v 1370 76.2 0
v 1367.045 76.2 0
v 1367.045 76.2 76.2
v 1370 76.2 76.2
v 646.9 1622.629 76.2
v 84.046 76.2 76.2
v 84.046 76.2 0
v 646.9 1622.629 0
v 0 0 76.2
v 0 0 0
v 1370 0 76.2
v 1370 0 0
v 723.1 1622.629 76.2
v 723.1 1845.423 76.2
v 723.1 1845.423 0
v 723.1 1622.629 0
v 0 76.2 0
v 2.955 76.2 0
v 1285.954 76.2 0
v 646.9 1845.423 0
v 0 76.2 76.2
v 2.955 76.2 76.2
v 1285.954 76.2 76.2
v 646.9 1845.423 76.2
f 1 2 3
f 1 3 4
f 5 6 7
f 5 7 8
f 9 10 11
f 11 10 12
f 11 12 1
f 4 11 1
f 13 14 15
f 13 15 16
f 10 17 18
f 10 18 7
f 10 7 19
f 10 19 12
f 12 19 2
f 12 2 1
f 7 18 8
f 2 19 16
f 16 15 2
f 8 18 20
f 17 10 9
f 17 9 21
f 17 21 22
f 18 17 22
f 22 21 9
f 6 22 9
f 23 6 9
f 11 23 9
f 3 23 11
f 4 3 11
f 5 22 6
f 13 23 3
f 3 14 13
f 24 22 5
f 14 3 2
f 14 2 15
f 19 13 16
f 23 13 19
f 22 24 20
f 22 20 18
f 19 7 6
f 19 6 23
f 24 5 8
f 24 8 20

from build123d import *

# Parameters (mm, degrees)
CROQUIS1_W              = 1370
CROQUIS1_H              = 76.2
SALIENTE_EXTRUIR1_DEPTH = 76.2
SALIENTE_EXTRUIR2_DEPTH = 76.2


with BuildPart() as part:
    # Croquis1 → Saliente-Extruir1 (new body)
    with BuildSketch(Plane.XY):
        with Locations((685, 38.1)):
            Rectangle(CROQUIS1_W, CROQUIS1_H)
    extrude(amount=SALIENTE_EXTRUIR1_DEPTH)

    # Croquis2 → Saliente-Extruir2 (add)
    with BuildSketch(Plane.XY.offset(76.2)):
        Polygon((723.1, 1845.423164628), (723.1, 1622.629269336), (1285.954223436, 76.2), (1367.044569699, 76.2), align=None)
        Polygon((2.955430301, 76.2), (84.045776564, 76.2), (646.9, 1622.629269336), (646.9, 1845.423164628), align=None)
    extrude(amount=-SALIENTE_EXTRUIR2_DEPTH)


solid = part.part
